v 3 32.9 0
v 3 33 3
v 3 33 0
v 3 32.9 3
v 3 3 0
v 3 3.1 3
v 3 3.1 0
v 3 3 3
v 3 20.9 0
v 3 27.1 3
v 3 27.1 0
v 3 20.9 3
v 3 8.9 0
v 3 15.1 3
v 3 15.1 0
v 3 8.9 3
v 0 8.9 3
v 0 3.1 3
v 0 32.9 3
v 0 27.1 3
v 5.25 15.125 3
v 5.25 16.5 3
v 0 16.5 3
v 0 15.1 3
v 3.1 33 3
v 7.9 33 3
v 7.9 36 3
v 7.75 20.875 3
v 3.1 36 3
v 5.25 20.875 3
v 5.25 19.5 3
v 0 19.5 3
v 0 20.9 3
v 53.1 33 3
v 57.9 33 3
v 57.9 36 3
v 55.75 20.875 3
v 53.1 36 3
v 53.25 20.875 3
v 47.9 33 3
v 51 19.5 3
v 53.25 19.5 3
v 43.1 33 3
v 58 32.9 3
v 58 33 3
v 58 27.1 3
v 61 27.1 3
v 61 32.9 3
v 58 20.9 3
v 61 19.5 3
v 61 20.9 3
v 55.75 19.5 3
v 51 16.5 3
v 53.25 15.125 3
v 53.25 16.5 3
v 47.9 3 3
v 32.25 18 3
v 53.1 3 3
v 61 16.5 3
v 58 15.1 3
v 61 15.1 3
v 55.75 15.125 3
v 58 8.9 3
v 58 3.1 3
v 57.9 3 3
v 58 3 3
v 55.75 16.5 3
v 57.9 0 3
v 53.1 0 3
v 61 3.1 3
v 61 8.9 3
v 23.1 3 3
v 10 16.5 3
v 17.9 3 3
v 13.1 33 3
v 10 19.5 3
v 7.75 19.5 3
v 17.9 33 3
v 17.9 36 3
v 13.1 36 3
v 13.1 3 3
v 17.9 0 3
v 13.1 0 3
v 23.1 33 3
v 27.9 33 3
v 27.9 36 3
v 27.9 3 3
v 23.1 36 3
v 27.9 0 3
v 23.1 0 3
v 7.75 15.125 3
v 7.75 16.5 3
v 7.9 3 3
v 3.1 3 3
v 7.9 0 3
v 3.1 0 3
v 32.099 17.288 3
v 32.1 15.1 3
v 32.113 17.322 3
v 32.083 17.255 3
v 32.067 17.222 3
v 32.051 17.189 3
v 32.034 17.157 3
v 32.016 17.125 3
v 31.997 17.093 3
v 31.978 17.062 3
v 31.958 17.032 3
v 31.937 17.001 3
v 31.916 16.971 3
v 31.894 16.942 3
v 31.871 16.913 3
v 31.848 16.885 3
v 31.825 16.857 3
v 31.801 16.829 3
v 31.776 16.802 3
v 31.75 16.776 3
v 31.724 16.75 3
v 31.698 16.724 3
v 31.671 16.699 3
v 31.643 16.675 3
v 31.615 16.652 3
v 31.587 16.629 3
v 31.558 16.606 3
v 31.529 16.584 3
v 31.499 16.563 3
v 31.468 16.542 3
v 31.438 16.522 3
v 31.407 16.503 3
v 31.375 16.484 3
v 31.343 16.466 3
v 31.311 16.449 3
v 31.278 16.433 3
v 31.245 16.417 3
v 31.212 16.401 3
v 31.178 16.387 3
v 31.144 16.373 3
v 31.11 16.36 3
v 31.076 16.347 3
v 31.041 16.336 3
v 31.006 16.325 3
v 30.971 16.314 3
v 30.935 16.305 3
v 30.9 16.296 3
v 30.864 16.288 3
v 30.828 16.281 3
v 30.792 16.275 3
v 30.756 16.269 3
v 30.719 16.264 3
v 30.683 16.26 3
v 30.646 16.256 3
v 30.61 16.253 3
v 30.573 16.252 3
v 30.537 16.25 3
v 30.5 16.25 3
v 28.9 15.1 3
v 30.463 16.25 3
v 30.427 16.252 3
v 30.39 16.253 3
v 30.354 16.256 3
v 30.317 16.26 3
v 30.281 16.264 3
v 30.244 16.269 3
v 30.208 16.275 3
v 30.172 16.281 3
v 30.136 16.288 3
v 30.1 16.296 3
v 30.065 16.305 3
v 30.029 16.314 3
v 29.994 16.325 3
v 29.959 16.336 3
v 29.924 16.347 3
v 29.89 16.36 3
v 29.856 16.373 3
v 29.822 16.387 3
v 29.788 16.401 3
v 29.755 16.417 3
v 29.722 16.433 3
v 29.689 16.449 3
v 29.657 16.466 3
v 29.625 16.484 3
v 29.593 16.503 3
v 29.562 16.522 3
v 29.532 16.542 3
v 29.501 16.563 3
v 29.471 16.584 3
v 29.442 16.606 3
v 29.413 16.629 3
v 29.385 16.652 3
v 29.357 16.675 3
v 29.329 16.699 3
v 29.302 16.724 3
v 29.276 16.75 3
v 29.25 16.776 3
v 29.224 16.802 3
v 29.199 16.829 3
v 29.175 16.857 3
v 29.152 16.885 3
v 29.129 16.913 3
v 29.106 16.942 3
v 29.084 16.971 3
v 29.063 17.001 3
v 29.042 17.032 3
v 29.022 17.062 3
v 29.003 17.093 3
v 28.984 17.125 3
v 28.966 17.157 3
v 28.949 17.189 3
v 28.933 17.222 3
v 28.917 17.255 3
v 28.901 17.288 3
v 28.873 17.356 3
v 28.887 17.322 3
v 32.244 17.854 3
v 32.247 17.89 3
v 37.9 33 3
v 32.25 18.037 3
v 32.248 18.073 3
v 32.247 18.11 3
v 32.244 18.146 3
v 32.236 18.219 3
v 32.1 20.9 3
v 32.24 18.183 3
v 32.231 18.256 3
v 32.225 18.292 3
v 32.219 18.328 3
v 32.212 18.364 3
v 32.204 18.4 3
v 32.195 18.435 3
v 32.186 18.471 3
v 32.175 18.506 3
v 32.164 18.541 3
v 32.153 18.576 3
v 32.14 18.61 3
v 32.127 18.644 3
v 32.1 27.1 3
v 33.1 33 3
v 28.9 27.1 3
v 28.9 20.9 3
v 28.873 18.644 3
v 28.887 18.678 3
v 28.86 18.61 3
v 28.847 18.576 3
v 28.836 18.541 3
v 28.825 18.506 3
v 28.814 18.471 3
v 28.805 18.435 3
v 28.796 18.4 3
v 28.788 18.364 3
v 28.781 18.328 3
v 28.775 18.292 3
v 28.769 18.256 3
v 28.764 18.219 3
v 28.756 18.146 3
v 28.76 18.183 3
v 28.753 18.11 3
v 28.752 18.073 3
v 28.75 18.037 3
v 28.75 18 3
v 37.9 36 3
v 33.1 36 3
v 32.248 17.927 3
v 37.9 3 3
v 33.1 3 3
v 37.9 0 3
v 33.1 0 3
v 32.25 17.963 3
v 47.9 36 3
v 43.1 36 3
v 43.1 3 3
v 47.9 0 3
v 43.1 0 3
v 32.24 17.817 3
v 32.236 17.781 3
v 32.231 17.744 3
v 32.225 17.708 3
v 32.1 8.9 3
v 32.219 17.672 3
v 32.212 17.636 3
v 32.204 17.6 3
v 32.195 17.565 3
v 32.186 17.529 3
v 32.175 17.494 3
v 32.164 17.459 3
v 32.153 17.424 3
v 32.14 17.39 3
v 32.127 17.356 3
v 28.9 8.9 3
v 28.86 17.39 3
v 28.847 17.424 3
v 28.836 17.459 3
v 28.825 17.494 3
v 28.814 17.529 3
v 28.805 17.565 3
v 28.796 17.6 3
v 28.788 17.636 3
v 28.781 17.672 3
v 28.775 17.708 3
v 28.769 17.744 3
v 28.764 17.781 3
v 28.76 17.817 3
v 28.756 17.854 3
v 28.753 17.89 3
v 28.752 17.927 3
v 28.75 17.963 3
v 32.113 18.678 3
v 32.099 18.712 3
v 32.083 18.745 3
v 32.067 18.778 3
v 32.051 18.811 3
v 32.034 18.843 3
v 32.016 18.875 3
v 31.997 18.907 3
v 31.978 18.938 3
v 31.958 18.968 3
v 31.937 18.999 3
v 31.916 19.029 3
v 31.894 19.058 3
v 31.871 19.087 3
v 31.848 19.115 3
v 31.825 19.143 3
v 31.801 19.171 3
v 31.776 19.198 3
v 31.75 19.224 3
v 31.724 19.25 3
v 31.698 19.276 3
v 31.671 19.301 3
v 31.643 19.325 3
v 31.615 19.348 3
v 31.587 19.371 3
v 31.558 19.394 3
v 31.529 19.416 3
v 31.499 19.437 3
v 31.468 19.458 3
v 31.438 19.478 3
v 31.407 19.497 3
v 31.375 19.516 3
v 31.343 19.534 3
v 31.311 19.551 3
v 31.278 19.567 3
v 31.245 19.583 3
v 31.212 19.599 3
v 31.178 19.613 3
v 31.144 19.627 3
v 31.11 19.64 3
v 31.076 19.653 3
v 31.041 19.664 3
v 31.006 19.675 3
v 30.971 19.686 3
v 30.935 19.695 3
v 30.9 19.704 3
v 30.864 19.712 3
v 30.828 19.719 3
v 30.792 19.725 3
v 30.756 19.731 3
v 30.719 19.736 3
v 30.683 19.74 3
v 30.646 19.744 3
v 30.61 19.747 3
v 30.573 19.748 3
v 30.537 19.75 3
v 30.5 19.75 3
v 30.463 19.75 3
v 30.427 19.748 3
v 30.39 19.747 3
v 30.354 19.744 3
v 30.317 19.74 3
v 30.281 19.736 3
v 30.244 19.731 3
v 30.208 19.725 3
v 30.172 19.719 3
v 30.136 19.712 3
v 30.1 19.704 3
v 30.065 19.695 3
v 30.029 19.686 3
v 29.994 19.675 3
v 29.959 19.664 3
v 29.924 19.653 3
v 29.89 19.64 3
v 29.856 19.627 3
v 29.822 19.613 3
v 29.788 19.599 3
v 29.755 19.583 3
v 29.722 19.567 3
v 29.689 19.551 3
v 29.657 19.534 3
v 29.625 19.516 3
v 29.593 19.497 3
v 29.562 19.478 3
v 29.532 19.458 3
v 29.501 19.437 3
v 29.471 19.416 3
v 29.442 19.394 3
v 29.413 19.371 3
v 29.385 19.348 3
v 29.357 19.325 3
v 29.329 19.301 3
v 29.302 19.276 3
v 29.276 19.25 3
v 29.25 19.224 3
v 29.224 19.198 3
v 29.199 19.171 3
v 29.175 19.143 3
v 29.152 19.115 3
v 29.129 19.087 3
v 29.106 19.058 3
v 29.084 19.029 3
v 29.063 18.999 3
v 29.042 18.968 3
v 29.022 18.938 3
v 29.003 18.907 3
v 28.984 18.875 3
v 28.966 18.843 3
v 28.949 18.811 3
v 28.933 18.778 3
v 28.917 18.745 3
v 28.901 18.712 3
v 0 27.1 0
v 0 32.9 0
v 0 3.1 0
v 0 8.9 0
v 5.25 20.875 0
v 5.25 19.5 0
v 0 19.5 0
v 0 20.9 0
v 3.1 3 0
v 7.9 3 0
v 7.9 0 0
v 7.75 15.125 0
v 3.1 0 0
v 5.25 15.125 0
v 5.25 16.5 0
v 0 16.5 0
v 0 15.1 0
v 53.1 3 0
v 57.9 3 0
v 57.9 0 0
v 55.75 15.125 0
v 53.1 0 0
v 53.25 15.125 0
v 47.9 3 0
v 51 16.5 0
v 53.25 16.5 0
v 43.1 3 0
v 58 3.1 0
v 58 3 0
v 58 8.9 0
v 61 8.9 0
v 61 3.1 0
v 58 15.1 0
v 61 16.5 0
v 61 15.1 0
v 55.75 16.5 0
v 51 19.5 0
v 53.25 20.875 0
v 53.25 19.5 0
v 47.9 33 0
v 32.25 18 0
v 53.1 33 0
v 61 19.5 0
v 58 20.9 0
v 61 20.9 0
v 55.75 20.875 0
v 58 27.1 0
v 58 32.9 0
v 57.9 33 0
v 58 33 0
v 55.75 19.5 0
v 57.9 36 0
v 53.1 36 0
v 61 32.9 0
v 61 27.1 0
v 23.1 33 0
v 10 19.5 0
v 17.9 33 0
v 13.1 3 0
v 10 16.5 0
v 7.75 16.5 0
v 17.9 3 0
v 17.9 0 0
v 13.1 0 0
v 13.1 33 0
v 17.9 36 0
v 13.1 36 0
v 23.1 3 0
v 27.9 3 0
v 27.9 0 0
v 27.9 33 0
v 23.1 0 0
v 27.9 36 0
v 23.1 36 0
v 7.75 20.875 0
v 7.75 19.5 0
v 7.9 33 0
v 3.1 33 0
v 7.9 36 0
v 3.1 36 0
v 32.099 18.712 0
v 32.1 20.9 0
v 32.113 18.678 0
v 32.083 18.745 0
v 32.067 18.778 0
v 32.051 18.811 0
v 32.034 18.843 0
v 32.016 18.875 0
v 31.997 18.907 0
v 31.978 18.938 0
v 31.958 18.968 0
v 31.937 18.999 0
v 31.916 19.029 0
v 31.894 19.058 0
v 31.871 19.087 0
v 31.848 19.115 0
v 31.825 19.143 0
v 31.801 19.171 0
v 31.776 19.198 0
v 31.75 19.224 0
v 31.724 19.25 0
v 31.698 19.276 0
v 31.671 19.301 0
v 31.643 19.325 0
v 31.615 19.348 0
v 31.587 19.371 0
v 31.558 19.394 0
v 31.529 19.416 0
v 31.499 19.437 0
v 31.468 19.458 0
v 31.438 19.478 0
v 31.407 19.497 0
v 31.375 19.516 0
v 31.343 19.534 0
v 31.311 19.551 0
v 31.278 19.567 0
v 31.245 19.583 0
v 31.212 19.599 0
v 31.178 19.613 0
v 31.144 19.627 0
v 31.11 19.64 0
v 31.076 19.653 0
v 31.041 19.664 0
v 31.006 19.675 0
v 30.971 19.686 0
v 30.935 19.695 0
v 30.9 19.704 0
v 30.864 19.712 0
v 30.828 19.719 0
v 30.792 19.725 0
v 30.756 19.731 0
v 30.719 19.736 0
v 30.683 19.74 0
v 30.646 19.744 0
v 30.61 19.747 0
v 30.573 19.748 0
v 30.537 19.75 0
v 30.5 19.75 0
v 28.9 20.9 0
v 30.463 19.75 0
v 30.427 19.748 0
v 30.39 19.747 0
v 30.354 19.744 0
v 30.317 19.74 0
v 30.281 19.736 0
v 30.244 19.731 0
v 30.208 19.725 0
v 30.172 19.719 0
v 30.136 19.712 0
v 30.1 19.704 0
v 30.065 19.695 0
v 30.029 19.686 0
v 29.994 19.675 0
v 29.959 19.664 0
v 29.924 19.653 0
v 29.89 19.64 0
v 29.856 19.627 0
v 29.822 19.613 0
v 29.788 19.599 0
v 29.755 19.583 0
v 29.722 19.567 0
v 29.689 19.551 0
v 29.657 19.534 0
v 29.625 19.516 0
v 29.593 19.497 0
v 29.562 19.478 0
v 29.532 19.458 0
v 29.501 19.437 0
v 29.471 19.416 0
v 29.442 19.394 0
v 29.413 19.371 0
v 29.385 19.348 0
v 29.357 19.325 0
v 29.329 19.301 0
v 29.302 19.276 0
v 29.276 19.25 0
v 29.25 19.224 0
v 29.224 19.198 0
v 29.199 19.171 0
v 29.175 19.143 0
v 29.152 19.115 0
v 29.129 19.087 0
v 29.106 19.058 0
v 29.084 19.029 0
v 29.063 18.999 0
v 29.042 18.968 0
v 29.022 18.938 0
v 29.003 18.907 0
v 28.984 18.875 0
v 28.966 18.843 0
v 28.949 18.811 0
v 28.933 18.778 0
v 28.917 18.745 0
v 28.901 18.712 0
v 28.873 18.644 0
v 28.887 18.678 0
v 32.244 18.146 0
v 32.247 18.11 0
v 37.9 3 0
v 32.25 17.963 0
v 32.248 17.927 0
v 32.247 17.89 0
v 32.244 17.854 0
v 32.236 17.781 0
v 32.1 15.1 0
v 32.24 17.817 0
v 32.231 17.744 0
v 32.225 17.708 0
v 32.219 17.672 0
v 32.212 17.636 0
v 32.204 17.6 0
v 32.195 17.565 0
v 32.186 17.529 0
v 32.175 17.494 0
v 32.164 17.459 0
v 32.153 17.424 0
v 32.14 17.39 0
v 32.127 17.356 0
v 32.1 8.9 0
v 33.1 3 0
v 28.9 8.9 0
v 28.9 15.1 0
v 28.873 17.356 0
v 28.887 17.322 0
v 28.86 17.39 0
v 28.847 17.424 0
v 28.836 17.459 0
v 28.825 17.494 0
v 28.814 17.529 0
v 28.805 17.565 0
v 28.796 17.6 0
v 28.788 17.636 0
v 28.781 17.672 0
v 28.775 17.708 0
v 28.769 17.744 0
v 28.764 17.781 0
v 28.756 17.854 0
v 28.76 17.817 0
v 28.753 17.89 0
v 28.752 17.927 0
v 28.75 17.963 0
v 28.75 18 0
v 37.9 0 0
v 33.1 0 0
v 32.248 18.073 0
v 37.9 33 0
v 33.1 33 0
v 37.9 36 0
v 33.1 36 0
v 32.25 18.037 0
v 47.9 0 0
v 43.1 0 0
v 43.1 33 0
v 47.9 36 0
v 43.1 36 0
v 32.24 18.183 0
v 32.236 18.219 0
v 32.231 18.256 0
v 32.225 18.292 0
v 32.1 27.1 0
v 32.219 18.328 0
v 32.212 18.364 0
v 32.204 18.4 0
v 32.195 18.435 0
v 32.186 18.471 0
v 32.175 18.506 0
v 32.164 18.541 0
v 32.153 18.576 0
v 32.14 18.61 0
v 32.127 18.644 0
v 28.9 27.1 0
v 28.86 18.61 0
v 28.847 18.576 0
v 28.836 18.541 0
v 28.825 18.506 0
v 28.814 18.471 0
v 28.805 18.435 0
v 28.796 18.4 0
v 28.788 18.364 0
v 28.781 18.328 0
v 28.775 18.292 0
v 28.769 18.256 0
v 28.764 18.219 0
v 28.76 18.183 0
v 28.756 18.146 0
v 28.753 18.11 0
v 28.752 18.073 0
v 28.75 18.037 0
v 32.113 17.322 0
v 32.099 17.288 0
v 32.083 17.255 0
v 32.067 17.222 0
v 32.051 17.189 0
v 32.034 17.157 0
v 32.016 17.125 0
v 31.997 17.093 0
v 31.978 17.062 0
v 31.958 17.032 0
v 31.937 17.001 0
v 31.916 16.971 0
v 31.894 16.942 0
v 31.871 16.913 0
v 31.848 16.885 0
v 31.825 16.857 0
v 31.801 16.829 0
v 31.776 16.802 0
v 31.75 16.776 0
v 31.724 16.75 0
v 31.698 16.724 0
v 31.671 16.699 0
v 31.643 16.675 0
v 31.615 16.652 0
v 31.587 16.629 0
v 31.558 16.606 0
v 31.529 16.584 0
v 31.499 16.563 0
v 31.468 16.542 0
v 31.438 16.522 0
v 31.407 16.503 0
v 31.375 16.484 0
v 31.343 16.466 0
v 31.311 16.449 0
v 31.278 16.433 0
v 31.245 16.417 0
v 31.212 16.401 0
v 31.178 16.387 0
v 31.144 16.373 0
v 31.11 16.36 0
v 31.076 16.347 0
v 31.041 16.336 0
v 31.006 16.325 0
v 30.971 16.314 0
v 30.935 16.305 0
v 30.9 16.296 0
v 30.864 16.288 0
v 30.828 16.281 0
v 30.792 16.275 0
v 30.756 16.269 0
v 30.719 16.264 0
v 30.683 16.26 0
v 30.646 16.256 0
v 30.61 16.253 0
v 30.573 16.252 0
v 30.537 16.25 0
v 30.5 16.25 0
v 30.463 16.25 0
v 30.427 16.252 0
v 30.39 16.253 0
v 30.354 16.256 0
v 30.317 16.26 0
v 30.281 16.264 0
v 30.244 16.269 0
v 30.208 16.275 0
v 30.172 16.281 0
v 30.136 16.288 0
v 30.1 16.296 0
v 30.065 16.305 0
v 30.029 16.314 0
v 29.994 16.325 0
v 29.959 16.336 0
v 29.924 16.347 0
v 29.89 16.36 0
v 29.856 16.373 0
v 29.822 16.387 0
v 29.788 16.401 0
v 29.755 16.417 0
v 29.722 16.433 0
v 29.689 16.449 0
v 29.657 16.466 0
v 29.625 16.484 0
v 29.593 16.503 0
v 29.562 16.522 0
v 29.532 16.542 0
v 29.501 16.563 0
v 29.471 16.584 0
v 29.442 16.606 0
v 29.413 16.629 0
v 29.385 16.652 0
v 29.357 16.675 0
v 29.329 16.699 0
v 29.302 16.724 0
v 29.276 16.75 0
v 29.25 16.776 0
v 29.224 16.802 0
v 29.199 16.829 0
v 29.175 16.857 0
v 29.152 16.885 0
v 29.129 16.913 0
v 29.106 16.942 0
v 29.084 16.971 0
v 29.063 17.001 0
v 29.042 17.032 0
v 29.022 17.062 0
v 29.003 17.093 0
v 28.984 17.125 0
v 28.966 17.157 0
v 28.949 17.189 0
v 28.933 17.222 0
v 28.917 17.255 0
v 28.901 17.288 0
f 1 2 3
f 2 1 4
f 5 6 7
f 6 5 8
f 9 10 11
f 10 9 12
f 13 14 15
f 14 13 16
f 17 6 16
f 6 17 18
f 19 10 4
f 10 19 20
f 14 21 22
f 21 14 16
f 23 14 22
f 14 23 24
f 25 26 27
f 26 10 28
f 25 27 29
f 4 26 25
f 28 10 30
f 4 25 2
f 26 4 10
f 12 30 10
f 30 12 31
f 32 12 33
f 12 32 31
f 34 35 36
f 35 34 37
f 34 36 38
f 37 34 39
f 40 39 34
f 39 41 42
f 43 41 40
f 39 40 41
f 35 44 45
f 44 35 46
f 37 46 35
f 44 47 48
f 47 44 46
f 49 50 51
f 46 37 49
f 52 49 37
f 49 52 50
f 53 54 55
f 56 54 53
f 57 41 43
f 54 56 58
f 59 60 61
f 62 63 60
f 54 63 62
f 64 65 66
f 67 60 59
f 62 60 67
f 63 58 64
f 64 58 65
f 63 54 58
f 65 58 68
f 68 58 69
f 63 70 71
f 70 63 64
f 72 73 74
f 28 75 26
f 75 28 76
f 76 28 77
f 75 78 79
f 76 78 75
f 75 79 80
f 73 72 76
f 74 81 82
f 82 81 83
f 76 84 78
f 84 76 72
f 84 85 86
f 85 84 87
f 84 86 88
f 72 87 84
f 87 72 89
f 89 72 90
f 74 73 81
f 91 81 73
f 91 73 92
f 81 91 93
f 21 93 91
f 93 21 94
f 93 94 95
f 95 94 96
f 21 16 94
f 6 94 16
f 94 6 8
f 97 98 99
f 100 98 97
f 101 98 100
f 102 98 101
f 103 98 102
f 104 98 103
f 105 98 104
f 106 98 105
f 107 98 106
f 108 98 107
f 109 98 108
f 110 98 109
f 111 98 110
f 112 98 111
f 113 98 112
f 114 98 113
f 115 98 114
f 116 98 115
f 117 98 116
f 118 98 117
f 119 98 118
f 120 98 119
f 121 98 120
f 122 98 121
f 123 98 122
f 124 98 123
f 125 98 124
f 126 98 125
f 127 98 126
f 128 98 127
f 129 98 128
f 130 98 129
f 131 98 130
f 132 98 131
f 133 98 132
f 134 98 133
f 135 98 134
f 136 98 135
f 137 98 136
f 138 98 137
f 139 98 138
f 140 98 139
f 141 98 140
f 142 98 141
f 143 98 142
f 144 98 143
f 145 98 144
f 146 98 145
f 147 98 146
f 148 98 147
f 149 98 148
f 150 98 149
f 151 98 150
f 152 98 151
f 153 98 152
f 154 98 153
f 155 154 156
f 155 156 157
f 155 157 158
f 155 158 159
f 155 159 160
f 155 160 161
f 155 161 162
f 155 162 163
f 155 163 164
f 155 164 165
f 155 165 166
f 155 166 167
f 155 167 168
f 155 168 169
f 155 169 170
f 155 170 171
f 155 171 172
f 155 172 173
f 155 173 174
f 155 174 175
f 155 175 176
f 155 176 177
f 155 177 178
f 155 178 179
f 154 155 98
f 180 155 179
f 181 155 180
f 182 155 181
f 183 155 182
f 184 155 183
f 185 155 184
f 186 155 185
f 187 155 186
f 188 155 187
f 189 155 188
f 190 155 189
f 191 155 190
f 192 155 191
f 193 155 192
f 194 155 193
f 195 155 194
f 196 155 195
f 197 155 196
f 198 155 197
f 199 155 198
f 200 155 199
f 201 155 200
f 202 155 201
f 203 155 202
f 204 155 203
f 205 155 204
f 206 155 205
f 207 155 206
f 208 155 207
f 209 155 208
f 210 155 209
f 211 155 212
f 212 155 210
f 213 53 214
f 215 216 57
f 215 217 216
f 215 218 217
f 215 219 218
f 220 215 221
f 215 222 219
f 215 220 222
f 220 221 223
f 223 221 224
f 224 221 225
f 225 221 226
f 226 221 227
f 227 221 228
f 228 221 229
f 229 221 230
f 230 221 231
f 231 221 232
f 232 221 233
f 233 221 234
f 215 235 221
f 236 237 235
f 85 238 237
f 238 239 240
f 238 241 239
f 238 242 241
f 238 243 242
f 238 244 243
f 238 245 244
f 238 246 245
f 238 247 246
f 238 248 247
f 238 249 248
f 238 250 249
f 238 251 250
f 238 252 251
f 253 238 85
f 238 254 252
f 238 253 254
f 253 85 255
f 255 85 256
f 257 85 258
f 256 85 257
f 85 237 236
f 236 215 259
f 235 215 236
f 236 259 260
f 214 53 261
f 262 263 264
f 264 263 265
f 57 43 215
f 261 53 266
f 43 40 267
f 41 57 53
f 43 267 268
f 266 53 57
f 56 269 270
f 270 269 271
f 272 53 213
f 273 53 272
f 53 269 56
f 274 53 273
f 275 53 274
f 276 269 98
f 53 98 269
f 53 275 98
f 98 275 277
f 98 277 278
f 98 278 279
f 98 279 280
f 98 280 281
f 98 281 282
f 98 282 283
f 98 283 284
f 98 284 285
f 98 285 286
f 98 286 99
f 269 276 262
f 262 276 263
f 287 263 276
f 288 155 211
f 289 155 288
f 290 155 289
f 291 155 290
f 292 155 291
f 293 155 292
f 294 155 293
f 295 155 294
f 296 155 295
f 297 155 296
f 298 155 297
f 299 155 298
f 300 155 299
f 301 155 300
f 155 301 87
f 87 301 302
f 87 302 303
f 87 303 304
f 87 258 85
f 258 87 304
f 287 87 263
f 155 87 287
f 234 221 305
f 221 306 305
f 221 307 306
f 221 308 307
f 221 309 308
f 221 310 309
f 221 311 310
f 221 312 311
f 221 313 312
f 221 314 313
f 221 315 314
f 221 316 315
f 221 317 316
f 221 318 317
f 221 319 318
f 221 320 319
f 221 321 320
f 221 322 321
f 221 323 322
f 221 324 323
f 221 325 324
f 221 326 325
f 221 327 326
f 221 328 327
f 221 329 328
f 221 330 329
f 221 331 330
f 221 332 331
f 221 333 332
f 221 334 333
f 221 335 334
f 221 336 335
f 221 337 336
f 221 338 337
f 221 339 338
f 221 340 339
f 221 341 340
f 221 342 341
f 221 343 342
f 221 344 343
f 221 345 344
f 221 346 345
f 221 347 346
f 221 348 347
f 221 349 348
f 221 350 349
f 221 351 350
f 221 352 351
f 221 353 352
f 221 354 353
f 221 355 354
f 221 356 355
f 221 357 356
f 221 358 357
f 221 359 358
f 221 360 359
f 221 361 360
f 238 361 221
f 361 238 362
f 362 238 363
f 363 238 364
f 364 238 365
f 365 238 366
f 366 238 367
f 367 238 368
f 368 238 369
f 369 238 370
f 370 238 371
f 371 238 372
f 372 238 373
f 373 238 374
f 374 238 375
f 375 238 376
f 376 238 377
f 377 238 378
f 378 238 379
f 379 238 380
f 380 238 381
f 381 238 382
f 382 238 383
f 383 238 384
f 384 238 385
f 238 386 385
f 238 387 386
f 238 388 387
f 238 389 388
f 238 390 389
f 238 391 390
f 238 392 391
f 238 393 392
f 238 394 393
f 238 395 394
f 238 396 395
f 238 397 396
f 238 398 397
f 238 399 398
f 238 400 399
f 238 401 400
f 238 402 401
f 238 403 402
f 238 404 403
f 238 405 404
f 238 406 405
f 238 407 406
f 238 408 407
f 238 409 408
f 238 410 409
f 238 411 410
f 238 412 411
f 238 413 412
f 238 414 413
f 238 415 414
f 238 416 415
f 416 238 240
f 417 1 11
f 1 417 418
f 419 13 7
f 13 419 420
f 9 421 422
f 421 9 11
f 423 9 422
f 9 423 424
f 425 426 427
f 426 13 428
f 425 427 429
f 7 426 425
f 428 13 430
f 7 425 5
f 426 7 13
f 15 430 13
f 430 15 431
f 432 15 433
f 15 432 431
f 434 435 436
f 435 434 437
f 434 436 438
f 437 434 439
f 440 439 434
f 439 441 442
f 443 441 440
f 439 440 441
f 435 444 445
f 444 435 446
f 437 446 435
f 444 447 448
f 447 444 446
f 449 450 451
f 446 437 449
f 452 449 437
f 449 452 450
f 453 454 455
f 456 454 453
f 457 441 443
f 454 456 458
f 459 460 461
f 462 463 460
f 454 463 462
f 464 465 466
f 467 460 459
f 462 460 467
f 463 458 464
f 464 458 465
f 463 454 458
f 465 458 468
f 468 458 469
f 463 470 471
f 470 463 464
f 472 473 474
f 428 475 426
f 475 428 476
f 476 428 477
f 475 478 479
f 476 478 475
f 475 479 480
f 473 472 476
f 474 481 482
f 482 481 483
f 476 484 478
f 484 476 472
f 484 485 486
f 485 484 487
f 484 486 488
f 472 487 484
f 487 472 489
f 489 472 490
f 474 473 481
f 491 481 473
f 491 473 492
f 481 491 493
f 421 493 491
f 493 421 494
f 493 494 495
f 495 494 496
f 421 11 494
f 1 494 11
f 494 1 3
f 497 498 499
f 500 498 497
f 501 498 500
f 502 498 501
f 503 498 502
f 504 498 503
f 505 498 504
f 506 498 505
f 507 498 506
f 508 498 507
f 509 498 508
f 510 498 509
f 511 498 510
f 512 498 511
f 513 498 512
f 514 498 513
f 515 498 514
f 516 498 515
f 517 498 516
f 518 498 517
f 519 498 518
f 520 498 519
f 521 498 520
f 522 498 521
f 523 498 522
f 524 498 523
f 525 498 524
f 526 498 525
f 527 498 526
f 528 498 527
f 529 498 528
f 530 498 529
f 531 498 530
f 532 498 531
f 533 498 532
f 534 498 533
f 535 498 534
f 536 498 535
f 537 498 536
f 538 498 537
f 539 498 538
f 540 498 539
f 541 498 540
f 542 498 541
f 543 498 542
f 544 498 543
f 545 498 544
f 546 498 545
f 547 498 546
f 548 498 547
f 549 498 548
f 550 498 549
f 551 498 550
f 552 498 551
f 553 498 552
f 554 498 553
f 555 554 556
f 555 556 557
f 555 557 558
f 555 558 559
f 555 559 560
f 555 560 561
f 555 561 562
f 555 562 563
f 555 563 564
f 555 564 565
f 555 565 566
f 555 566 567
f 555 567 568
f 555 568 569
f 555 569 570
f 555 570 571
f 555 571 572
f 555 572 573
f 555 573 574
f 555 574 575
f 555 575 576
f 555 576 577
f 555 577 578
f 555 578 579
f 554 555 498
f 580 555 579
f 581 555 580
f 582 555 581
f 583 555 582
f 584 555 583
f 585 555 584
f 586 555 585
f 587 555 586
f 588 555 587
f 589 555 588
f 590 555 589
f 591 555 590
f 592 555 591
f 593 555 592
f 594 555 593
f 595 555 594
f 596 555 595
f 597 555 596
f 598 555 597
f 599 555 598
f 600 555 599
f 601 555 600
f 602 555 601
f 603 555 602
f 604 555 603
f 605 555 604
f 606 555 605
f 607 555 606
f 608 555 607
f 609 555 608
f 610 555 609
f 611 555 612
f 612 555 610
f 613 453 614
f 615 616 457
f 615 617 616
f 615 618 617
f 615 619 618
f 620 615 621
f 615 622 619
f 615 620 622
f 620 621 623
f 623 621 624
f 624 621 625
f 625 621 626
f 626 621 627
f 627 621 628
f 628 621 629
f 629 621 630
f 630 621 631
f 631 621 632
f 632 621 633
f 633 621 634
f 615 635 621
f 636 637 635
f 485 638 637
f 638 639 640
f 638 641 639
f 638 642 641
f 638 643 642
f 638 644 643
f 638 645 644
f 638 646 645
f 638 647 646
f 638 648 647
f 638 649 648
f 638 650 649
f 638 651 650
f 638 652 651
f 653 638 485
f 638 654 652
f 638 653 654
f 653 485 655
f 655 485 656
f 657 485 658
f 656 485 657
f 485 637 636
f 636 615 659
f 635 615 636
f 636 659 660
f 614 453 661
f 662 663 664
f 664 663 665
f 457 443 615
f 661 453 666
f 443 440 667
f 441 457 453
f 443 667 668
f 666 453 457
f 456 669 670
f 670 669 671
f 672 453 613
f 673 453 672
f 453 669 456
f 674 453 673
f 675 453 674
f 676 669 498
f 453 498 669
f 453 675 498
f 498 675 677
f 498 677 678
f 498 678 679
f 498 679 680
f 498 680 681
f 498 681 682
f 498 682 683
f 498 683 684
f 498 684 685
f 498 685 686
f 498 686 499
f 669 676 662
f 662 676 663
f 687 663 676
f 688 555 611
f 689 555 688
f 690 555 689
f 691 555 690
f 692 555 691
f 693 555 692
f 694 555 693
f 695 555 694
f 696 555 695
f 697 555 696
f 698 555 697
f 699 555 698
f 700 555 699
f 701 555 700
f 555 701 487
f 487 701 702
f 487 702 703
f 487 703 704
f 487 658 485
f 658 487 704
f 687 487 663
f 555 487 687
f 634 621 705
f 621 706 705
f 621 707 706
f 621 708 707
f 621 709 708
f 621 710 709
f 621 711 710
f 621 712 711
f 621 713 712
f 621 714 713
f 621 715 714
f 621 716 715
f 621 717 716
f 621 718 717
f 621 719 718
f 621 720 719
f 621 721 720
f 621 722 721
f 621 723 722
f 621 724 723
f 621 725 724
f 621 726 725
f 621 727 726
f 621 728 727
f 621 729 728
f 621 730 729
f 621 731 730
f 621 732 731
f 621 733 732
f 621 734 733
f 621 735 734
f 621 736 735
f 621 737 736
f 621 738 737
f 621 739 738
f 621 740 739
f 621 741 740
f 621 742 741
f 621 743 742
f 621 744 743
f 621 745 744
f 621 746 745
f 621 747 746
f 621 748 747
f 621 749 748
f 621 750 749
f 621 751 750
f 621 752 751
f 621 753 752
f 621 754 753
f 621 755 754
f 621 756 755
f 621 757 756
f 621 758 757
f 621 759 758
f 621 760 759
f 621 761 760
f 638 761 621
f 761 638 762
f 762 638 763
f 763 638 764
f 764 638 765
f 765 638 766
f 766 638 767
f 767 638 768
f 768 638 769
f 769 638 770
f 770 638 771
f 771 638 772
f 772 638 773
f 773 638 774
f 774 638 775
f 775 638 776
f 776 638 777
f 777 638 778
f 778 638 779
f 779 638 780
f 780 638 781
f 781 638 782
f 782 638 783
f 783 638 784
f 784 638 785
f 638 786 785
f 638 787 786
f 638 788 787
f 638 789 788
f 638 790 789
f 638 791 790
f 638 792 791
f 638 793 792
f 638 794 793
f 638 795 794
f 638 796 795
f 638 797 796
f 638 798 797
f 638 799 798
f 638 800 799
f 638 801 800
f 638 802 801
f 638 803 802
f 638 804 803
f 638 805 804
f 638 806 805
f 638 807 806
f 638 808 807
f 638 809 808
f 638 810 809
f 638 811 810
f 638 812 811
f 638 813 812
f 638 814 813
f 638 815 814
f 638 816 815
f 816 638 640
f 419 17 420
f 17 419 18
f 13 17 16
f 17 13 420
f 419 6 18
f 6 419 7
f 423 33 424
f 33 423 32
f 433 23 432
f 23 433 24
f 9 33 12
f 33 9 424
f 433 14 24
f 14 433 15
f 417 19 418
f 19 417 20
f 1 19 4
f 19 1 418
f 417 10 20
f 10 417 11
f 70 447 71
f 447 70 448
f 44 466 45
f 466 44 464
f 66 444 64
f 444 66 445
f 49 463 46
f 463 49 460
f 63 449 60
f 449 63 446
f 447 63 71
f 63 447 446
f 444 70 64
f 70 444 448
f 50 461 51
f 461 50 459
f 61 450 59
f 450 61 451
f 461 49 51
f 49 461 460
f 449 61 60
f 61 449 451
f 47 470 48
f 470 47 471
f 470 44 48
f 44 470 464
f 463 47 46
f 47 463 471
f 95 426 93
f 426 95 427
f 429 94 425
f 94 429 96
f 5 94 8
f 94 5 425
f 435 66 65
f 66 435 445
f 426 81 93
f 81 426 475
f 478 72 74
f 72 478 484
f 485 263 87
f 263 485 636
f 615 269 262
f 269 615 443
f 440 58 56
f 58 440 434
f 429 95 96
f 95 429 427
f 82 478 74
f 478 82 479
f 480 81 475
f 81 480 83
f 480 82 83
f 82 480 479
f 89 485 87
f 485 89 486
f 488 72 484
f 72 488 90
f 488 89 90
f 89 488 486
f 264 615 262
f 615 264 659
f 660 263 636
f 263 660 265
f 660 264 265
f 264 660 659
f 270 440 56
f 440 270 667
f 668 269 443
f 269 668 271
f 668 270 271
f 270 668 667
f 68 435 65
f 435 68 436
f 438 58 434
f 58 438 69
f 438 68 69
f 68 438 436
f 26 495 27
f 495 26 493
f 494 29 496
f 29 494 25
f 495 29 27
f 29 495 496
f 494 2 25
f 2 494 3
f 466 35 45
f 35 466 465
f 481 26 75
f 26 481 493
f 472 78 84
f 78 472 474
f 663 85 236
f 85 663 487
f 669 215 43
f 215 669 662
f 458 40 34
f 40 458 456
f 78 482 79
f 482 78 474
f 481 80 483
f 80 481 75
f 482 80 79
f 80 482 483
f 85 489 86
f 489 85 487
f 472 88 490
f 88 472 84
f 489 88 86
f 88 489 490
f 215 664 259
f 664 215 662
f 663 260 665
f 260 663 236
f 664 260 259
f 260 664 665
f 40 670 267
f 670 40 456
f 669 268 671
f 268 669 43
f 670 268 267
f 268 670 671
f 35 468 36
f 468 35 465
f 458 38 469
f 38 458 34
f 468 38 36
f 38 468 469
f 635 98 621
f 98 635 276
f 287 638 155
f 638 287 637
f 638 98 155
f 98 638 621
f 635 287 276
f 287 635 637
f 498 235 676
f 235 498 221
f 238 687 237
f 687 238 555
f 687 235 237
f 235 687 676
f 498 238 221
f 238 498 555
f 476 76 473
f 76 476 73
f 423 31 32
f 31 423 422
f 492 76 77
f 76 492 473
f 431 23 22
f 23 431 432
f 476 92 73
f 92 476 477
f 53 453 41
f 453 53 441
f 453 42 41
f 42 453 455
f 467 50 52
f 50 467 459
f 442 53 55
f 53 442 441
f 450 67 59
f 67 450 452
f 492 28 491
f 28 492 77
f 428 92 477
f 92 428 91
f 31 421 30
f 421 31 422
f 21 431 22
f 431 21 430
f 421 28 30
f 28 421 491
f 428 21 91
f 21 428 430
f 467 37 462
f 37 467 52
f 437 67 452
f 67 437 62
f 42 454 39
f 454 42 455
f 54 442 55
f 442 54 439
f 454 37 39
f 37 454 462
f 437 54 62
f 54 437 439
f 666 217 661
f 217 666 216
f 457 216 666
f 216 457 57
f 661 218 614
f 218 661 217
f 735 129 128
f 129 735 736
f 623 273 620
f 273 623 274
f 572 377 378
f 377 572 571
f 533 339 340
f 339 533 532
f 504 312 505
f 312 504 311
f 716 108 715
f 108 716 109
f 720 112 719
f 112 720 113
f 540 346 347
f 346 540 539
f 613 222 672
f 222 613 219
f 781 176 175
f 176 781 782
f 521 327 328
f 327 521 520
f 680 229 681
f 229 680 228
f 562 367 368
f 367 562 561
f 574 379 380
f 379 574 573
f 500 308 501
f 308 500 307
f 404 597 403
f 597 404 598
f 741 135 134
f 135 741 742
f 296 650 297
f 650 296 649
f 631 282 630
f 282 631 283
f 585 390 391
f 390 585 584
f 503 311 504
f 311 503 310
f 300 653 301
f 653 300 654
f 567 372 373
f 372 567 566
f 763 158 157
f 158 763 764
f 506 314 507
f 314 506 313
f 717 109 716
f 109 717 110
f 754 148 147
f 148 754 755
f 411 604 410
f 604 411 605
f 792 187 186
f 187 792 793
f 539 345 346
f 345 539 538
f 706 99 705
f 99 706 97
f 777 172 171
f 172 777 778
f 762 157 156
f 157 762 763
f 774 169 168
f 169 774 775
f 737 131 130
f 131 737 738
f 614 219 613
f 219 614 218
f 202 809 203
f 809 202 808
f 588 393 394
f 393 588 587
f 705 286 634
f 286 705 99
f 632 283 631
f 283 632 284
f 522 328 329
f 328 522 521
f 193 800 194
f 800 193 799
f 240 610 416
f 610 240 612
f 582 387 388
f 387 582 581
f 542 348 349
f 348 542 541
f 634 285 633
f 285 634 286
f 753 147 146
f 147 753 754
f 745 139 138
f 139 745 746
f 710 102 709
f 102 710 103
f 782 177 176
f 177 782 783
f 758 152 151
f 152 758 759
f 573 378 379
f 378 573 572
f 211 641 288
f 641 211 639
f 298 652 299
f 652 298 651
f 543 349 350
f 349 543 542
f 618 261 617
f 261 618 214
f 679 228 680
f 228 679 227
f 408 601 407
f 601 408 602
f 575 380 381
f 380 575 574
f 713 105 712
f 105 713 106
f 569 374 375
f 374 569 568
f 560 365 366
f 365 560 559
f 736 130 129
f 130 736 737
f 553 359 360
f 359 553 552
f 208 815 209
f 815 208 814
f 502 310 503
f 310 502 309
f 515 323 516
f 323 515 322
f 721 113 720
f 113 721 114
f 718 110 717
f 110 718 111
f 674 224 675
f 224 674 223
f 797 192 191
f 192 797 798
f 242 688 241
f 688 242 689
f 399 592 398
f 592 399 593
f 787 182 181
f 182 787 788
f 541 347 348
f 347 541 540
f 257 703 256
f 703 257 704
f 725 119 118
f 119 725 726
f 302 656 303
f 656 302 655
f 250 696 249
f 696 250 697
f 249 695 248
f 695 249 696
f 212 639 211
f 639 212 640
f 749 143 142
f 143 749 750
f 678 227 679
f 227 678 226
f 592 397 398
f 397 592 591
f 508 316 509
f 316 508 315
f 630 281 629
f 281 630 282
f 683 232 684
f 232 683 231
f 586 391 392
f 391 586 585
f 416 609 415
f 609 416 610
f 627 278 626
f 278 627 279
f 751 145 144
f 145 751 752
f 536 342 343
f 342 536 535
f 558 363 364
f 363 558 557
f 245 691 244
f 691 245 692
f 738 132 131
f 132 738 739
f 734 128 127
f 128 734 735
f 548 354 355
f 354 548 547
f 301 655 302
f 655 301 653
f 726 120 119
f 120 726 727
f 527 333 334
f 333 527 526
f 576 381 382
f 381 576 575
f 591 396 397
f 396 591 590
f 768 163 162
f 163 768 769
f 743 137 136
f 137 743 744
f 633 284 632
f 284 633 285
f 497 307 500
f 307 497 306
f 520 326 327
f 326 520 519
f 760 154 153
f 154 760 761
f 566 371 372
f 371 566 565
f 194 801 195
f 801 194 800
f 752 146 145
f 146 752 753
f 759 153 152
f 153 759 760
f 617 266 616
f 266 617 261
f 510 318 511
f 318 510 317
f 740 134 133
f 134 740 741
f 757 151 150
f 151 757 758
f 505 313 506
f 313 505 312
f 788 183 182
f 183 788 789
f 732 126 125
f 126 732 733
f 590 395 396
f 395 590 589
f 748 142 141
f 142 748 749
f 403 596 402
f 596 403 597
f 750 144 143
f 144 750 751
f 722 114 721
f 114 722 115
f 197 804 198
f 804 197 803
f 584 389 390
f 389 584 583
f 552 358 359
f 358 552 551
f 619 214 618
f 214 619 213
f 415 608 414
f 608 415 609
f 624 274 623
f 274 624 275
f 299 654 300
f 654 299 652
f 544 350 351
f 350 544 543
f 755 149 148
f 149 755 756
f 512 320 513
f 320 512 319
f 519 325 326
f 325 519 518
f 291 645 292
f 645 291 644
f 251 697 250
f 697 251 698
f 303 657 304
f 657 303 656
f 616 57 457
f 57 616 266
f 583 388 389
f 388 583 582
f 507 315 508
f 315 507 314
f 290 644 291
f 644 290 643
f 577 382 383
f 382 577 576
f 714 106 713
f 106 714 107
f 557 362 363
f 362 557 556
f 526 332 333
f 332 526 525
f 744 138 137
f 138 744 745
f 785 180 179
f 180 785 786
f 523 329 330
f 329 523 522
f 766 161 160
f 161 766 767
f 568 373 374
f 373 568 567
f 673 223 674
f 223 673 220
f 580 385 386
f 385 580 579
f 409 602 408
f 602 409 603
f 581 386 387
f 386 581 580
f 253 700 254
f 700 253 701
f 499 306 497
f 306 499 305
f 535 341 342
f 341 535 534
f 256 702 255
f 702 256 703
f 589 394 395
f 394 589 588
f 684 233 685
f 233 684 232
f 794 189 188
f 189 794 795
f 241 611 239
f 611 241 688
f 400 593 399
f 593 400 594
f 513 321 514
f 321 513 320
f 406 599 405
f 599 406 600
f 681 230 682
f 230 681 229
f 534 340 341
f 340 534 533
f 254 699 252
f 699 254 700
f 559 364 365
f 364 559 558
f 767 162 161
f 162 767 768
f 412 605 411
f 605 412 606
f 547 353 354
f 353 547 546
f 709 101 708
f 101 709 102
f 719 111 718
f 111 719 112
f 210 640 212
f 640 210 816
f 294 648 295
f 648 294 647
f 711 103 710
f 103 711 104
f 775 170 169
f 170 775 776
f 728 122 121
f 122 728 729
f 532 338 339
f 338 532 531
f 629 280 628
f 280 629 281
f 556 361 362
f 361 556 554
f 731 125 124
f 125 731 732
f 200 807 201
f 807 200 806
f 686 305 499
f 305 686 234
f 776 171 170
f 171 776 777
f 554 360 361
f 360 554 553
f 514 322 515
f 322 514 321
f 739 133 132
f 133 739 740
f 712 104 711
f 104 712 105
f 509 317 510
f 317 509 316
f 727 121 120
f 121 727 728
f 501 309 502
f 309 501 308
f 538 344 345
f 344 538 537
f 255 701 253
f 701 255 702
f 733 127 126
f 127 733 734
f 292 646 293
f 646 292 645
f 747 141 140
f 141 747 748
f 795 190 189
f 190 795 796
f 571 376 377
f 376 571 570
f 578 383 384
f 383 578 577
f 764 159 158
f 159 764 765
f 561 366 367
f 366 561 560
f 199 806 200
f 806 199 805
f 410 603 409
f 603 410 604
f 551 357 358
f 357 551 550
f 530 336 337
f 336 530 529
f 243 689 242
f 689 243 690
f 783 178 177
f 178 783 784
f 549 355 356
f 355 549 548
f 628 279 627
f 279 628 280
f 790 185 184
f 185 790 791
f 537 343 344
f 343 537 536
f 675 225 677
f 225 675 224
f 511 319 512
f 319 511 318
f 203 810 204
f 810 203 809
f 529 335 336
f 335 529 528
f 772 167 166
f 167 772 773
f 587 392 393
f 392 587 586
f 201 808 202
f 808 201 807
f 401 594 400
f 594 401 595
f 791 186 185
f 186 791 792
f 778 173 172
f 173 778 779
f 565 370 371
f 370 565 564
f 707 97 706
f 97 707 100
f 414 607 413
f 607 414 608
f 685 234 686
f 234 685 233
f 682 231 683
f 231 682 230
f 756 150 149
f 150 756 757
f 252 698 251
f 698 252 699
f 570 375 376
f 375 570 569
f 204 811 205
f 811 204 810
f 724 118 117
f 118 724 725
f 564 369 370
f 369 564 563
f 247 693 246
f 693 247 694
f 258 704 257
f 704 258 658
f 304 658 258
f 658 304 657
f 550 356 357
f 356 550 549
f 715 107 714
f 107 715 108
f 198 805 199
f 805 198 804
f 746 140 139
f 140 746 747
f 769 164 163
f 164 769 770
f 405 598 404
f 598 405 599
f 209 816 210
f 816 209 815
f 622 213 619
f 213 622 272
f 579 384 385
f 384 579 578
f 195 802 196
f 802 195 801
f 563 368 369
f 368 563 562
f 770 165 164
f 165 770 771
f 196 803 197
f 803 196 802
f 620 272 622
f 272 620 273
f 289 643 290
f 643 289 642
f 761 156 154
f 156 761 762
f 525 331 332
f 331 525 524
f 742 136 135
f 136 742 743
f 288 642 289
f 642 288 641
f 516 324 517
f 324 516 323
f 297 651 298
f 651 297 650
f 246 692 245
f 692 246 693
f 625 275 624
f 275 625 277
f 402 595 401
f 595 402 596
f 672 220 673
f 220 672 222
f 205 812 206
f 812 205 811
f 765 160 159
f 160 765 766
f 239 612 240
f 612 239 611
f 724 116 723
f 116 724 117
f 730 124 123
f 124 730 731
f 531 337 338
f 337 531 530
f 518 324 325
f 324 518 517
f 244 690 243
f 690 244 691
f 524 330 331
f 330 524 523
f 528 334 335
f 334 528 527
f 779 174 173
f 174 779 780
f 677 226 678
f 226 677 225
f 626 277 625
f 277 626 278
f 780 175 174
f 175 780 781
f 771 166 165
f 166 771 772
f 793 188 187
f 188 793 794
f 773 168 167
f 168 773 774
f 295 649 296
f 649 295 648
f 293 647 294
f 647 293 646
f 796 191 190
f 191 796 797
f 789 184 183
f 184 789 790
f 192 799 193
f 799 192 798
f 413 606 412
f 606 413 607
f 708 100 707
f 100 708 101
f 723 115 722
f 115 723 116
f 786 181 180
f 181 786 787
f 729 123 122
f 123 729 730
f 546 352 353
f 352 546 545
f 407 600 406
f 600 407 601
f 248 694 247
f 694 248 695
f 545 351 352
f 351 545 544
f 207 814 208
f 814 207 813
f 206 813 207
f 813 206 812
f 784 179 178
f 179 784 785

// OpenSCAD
length = 61;
breadth = 36;
lct = 3; //laser cut sheet thickness (change the length and breadth accordingly)
flag = 0; // change flag for alternate position of teeth
tol = .1; //tolerance
//projection(cut = true) for z=0 plane, cut true gives top view of the object
t_length = 10;// length of t-slot screw
t_thick = 3;// diameter of t-slot screw
nut_dia = 5.75;// diameter of t-slot nut
nut_thick = 2.5;// thickness of t-slot nut
ch_dia = 3.5; //center hole diameter
ch_rad = ch_dia/2;
scr_tol = tol;// center rect hole tolerance across length
scr_tol2 = tol; //center rect hole tol across breadth
move_var = 1.5;//move the nut hole by X value
difference(){
union(){
    translate([lct,lct,0])cube([length-(2*lct),breadth-(2*lct),lct]);  //the cuboid

    for(y=[lct+tol:12:breadth])translate([0,y,0])cube([lct,6-2*tol,lct]);  //teeth left
    for(y=[lct+tol:12:breadth])translate([length-lct,y,0])cube([lct,6-2*tol,lct]);  //teeth right
            
    if(flag == 0){
        for(x=[lct+tol:10:length])translate([x,0,0])cube([5-2*tol,lct,lct]);  //teeth bottom
        for(x=[lct+tol:10:length])translate([x,breadth-lct,0])cube([5-tol*2,lct,lct]);  //teeth top 
       }
    if(flag == 1){
        for(x=[lct+5+tol:10:length-lct-1])translate([x,0,0])cube([5-2*tol,lct,lct]);
        for(x=[lct+5+tol:10:length-lct-1])translate([x,breadth-lct,0])cube([5-2*tol,lct,lct]);
       }
        }
union(){
    translate([0,lct+12+((6-t_thick)/2),0])cube([t_length,t_thick,lct]);//screw hole left
    
    translate([length-t_length,lct+12+((6-t_thick)/2),0])cube([t_length,t_thick,lct]);//screw hole right
    
    translate([move_var + (t_length-nut_thick)/2,(lct+12+((6-t_thick)/2))/*posn of t*/-((nut_dia-t_thick)/2),0])cube([nut_thick,nut_dia,lct]);//nuthole left
    
    translate([length-move_var-((t_length-nut_thick)/2)-nut_thick,(lct+12+((6-t_thick)/2))/*posn of t*/-((nut_dia-t_thick)/2),0])cube([nut_thick,nut_dia,lct]);//nuthole right
    
    for(y=[lct+6-scr_tol:12:breadth-lct-1])translate([((61-lct)/2)-scr_tol2,y,0])cube([lct+2*scr_tol2,6+2*scr_tol,lct]);//center two holes
    
    translate([length/2,breadth/2,0])cylinder(lct,r1=ch_rad,r2=ch_rad,center=false,$fn=300);//center screw hole
    }
}
